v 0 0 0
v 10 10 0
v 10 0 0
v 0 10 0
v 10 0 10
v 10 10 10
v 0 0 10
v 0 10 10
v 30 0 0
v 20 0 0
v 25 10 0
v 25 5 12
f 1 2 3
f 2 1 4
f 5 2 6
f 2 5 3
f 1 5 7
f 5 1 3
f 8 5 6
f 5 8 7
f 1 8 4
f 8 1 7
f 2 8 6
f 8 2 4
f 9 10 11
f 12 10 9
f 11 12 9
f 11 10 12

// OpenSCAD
polyhedron(
    points = [[0,0,0],[10,0,0],[10,10,0],[0,10,0], [0,0,10],[10,0,10],[10,10,10],[0,10,10]],
    faces  = [[0,1,2,3], [4,7,6,5], [0,4,5,1], [1,5,6,2], [2,6,7,3], [3,7,4,0]]
);
translate([20,0,0]) polyhedron(
    points = [[0,0,0],[10,0,0],[5,10,0],[5,5,12]],
    faces  = [[0,2,1],[0,1,3],[1,2,3],[2,0,3]]
);
